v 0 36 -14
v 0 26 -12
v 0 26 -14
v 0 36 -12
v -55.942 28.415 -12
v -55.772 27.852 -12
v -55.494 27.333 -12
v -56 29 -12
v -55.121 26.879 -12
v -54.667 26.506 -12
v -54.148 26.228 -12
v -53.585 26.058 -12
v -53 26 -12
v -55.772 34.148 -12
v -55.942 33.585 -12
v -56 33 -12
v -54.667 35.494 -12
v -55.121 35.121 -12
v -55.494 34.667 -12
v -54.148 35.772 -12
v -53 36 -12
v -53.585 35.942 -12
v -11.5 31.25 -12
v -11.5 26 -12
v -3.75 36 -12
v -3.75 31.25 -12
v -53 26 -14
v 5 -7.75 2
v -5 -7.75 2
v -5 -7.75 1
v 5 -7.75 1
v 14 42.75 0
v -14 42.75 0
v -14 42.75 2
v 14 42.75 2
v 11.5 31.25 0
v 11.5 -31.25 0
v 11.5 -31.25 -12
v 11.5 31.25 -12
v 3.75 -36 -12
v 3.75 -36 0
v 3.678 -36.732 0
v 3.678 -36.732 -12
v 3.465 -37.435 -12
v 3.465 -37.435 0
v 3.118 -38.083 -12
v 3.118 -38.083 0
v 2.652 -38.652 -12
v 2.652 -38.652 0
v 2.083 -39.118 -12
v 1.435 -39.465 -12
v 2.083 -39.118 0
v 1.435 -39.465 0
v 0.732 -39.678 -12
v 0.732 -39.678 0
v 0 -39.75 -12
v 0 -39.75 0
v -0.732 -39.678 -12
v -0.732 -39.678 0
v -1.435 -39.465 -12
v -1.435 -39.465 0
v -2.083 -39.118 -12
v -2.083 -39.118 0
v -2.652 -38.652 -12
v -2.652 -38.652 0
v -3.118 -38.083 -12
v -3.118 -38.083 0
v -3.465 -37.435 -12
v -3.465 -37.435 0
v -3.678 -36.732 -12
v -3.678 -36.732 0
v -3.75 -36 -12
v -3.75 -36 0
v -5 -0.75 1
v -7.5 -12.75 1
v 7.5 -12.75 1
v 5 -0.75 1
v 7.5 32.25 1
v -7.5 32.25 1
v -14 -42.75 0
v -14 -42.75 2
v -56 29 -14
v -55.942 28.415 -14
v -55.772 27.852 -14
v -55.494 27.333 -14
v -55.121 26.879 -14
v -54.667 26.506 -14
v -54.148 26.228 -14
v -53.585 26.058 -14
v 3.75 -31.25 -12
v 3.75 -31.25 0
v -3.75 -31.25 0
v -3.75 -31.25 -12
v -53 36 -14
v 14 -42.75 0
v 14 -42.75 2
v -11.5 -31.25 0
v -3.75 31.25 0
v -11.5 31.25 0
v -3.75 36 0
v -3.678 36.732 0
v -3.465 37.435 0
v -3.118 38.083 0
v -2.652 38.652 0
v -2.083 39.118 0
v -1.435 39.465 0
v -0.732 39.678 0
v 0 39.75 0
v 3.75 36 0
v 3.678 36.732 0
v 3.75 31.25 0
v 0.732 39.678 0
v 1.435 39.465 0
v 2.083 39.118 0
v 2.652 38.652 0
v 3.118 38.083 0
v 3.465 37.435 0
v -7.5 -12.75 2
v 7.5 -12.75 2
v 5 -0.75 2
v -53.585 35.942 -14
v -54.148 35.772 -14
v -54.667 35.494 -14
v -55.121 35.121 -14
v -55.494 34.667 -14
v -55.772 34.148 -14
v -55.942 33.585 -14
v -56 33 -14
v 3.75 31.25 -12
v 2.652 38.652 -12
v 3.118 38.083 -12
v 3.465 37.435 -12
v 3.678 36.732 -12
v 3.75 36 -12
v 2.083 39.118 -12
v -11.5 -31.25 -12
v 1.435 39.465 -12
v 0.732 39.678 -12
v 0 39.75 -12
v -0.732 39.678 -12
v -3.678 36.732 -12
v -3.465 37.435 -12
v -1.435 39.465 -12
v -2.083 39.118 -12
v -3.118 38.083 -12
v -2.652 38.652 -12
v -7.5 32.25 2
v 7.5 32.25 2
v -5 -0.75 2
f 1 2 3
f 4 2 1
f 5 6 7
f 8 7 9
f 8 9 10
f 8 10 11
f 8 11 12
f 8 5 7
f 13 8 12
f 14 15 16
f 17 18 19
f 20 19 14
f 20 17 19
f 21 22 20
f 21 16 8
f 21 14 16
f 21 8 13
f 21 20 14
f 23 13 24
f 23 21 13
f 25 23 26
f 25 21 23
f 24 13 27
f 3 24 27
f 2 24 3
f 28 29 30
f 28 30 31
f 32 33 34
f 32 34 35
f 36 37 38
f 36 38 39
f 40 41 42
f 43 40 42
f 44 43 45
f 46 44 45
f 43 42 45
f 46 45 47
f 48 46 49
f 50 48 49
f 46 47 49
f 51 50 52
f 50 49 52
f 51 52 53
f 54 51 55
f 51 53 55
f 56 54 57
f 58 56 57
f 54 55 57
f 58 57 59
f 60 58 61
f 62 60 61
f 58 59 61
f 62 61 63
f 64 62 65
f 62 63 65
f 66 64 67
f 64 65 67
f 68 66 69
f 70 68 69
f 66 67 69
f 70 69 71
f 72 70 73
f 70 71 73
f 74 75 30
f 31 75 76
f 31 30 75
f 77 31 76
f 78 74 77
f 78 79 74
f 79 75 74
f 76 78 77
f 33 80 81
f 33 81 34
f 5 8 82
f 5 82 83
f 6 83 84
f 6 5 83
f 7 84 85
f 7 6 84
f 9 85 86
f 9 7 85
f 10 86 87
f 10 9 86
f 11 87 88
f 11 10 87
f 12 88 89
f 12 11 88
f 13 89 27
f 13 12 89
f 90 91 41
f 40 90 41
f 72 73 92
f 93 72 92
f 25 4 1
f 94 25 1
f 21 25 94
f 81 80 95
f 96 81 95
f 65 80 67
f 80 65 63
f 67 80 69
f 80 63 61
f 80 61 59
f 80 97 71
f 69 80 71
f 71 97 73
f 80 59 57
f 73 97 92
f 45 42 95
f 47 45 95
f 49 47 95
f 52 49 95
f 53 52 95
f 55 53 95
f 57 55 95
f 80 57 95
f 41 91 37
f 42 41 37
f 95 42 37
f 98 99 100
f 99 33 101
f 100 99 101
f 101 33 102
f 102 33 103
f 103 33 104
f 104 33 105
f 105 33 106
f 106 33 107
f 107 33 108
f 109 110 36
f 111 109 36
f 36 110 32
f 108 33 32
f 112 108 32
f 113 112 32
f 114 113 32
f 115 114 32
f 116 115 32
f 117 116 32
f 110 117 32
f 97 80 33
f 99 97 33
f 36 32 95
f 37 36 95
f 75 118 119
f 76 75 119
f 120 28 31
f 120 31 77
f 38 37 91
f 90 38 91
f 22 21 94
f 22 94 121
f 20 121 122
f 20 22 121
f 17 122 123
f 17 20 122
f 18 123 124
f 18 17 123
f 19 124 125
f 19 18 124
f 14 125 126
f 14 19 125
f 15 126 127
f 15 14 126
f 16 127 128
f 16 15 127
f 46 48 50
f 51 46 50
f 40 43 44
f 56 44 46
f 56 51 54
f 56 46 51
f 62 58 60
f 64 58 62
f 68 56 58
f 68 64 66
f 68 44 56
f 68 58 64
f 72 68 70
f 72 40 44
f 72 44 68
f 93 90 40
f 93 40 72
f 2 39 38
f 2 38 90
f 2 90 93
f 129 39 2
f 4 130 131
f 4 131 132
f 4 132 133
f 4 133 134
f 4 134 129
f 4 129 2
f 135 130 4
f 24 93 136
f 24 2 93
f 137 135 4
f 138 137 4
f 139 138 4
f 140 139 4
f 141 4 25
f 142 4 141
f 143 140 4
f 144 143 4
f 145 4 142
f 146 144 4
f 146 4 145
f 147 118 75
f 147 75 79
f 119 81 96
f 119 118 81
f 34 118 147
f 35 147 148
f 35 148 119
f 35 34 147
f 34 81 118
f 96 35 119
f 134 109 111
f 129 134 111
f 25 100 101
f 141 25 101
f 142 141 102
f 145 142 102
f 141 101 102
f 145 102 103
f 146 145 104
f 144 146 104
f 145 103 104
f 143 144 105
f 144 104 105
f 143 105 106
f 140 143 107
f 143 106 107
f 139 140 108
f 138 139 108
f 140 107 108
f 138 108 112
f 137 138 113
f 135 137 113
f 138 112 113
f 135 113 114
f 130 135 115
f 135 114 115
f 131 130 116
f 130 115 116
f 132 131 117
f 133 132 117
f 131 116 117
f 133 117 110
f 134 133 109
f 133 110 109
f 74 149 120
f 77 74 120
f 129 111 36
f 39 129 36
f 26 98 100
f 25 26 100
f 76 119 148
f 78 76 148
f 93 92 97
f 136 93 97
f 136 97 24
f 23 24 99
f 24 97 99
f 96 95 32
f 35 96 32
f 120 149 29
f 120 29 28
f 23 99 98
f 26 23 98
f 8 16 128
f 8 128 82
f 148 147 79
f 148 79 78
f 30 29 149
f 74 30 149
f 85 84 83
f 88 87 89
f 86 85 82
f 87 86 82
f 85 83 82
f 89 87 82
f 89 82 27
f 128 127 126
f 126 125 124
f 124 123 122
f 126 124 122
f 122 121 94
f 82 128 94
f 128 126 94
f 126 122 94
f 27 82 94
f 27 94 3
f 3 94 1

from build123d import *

# Parameters (mm, degrees)
SKETCH_1_W          = 28
SKETCH_1_H          = 85.5
EXTRUDE_1_DEPTH     = 2
SKETCH_2_W          = 15
SKETCH_2_H          = 45
SKETCH_2_W_2        = 10
SKETCH_2_H_2        = 7
CUT_EXTRUDE_1_DEPTH = 1
SKETCH_3_W          = 7.5
SKETCH_3_H          = 62.5
SKETCH_3_W_2        = 7.75
EXTRUDE_2_DEPTH     = 12
EXTRUDE_3_DEPTH     = 2


with BuildPart() as part:
    # 草图1 → 凸台-拉伸1 (new body)
    with BuildSketch(Plane.XY):
        Rectangle(SKETCH_1_W, SKETCH_1_H)
    extrude(amount=EXTRUDE_1_DEPTH)

    # 草图2 → 切除-拉伸1 (cut)
    with BuildSketch(Plane.XY.offset(2)):
        with Locations((0, 9.75)):
            Rectangle(SKETCH_2_W, SKETCH_2_H)
        with Locations((0, -4.25)):
            Rectangle(SKETCH_2_W_2, SKETCH_2_H_2, mode=Mode.SUBTRACT)
    extrude(amount=-CUT_EXTRUDE_1_DEPTH, mode=Mode.SUBTRACT)

    # 草图3 → 凸台-拉伸2 (add)
    with BuildSketch(Plane(origin=(0, 0, 0), x_dir=(-1, 0, 0), z_dir=(0, 0, -1))):
        Rectangle(SKETCH_3_W, SKETCH_3_H)
        with Locations((-7.625, 0)):
            Rectangle(SKETCH_3_W_2, SKETCH_3_H)
        with Locations((7.625, 0)):
            Rectangle(SKETCH_3_W_2, SKETCH_3_H)
        with BuildLine():
            Line((-3.75, 36), (-3.75, 31.25))
            Line((-3.75, 31.25), (3.75, 31.25))
            Line((3.75, 31.25), (3.75, 36))
            ThreePointArc((3.75, 36), (0, 39.75), (-3.75, 36))
        make_face()
        with BuildLine():
            Line((3.75, -31.25), (-3.75, -31.25))
            Line((-3.75, -31.25), (-3.75, -36))
            ThreePointArc((-3.75, -36), (0, -39.75), (3.75, -36))
            Line((3.75, -36), (3.75, -31.25))
        make_face()
    extrude(amount=EXTRUDE_2_DEPTH)

    # 草图4 → 凸台-拉伸3 (add)
    with BuildSketch(Plane(origin=(0, 0, -12), x_dir=(-1, 0, 0), z_dir=(0, 0, -1))):
        with BuildLine():
            Line((0, 36), (53, 36))
            ThreePointArc((53, 36), (55.121320344, 35.121320344), (56, 33))
            Line((56, 33), (56, 29))
            ThreePointArc((56, 29), (55.121320344, 26.878679656), (53, 26))
            Line((53, 26), (0, 26))
            Line((0, 26), (0, 36))
        make_face()
    extrude(amount=EXTRUDE_3_DEPTH)


solid = part.part
